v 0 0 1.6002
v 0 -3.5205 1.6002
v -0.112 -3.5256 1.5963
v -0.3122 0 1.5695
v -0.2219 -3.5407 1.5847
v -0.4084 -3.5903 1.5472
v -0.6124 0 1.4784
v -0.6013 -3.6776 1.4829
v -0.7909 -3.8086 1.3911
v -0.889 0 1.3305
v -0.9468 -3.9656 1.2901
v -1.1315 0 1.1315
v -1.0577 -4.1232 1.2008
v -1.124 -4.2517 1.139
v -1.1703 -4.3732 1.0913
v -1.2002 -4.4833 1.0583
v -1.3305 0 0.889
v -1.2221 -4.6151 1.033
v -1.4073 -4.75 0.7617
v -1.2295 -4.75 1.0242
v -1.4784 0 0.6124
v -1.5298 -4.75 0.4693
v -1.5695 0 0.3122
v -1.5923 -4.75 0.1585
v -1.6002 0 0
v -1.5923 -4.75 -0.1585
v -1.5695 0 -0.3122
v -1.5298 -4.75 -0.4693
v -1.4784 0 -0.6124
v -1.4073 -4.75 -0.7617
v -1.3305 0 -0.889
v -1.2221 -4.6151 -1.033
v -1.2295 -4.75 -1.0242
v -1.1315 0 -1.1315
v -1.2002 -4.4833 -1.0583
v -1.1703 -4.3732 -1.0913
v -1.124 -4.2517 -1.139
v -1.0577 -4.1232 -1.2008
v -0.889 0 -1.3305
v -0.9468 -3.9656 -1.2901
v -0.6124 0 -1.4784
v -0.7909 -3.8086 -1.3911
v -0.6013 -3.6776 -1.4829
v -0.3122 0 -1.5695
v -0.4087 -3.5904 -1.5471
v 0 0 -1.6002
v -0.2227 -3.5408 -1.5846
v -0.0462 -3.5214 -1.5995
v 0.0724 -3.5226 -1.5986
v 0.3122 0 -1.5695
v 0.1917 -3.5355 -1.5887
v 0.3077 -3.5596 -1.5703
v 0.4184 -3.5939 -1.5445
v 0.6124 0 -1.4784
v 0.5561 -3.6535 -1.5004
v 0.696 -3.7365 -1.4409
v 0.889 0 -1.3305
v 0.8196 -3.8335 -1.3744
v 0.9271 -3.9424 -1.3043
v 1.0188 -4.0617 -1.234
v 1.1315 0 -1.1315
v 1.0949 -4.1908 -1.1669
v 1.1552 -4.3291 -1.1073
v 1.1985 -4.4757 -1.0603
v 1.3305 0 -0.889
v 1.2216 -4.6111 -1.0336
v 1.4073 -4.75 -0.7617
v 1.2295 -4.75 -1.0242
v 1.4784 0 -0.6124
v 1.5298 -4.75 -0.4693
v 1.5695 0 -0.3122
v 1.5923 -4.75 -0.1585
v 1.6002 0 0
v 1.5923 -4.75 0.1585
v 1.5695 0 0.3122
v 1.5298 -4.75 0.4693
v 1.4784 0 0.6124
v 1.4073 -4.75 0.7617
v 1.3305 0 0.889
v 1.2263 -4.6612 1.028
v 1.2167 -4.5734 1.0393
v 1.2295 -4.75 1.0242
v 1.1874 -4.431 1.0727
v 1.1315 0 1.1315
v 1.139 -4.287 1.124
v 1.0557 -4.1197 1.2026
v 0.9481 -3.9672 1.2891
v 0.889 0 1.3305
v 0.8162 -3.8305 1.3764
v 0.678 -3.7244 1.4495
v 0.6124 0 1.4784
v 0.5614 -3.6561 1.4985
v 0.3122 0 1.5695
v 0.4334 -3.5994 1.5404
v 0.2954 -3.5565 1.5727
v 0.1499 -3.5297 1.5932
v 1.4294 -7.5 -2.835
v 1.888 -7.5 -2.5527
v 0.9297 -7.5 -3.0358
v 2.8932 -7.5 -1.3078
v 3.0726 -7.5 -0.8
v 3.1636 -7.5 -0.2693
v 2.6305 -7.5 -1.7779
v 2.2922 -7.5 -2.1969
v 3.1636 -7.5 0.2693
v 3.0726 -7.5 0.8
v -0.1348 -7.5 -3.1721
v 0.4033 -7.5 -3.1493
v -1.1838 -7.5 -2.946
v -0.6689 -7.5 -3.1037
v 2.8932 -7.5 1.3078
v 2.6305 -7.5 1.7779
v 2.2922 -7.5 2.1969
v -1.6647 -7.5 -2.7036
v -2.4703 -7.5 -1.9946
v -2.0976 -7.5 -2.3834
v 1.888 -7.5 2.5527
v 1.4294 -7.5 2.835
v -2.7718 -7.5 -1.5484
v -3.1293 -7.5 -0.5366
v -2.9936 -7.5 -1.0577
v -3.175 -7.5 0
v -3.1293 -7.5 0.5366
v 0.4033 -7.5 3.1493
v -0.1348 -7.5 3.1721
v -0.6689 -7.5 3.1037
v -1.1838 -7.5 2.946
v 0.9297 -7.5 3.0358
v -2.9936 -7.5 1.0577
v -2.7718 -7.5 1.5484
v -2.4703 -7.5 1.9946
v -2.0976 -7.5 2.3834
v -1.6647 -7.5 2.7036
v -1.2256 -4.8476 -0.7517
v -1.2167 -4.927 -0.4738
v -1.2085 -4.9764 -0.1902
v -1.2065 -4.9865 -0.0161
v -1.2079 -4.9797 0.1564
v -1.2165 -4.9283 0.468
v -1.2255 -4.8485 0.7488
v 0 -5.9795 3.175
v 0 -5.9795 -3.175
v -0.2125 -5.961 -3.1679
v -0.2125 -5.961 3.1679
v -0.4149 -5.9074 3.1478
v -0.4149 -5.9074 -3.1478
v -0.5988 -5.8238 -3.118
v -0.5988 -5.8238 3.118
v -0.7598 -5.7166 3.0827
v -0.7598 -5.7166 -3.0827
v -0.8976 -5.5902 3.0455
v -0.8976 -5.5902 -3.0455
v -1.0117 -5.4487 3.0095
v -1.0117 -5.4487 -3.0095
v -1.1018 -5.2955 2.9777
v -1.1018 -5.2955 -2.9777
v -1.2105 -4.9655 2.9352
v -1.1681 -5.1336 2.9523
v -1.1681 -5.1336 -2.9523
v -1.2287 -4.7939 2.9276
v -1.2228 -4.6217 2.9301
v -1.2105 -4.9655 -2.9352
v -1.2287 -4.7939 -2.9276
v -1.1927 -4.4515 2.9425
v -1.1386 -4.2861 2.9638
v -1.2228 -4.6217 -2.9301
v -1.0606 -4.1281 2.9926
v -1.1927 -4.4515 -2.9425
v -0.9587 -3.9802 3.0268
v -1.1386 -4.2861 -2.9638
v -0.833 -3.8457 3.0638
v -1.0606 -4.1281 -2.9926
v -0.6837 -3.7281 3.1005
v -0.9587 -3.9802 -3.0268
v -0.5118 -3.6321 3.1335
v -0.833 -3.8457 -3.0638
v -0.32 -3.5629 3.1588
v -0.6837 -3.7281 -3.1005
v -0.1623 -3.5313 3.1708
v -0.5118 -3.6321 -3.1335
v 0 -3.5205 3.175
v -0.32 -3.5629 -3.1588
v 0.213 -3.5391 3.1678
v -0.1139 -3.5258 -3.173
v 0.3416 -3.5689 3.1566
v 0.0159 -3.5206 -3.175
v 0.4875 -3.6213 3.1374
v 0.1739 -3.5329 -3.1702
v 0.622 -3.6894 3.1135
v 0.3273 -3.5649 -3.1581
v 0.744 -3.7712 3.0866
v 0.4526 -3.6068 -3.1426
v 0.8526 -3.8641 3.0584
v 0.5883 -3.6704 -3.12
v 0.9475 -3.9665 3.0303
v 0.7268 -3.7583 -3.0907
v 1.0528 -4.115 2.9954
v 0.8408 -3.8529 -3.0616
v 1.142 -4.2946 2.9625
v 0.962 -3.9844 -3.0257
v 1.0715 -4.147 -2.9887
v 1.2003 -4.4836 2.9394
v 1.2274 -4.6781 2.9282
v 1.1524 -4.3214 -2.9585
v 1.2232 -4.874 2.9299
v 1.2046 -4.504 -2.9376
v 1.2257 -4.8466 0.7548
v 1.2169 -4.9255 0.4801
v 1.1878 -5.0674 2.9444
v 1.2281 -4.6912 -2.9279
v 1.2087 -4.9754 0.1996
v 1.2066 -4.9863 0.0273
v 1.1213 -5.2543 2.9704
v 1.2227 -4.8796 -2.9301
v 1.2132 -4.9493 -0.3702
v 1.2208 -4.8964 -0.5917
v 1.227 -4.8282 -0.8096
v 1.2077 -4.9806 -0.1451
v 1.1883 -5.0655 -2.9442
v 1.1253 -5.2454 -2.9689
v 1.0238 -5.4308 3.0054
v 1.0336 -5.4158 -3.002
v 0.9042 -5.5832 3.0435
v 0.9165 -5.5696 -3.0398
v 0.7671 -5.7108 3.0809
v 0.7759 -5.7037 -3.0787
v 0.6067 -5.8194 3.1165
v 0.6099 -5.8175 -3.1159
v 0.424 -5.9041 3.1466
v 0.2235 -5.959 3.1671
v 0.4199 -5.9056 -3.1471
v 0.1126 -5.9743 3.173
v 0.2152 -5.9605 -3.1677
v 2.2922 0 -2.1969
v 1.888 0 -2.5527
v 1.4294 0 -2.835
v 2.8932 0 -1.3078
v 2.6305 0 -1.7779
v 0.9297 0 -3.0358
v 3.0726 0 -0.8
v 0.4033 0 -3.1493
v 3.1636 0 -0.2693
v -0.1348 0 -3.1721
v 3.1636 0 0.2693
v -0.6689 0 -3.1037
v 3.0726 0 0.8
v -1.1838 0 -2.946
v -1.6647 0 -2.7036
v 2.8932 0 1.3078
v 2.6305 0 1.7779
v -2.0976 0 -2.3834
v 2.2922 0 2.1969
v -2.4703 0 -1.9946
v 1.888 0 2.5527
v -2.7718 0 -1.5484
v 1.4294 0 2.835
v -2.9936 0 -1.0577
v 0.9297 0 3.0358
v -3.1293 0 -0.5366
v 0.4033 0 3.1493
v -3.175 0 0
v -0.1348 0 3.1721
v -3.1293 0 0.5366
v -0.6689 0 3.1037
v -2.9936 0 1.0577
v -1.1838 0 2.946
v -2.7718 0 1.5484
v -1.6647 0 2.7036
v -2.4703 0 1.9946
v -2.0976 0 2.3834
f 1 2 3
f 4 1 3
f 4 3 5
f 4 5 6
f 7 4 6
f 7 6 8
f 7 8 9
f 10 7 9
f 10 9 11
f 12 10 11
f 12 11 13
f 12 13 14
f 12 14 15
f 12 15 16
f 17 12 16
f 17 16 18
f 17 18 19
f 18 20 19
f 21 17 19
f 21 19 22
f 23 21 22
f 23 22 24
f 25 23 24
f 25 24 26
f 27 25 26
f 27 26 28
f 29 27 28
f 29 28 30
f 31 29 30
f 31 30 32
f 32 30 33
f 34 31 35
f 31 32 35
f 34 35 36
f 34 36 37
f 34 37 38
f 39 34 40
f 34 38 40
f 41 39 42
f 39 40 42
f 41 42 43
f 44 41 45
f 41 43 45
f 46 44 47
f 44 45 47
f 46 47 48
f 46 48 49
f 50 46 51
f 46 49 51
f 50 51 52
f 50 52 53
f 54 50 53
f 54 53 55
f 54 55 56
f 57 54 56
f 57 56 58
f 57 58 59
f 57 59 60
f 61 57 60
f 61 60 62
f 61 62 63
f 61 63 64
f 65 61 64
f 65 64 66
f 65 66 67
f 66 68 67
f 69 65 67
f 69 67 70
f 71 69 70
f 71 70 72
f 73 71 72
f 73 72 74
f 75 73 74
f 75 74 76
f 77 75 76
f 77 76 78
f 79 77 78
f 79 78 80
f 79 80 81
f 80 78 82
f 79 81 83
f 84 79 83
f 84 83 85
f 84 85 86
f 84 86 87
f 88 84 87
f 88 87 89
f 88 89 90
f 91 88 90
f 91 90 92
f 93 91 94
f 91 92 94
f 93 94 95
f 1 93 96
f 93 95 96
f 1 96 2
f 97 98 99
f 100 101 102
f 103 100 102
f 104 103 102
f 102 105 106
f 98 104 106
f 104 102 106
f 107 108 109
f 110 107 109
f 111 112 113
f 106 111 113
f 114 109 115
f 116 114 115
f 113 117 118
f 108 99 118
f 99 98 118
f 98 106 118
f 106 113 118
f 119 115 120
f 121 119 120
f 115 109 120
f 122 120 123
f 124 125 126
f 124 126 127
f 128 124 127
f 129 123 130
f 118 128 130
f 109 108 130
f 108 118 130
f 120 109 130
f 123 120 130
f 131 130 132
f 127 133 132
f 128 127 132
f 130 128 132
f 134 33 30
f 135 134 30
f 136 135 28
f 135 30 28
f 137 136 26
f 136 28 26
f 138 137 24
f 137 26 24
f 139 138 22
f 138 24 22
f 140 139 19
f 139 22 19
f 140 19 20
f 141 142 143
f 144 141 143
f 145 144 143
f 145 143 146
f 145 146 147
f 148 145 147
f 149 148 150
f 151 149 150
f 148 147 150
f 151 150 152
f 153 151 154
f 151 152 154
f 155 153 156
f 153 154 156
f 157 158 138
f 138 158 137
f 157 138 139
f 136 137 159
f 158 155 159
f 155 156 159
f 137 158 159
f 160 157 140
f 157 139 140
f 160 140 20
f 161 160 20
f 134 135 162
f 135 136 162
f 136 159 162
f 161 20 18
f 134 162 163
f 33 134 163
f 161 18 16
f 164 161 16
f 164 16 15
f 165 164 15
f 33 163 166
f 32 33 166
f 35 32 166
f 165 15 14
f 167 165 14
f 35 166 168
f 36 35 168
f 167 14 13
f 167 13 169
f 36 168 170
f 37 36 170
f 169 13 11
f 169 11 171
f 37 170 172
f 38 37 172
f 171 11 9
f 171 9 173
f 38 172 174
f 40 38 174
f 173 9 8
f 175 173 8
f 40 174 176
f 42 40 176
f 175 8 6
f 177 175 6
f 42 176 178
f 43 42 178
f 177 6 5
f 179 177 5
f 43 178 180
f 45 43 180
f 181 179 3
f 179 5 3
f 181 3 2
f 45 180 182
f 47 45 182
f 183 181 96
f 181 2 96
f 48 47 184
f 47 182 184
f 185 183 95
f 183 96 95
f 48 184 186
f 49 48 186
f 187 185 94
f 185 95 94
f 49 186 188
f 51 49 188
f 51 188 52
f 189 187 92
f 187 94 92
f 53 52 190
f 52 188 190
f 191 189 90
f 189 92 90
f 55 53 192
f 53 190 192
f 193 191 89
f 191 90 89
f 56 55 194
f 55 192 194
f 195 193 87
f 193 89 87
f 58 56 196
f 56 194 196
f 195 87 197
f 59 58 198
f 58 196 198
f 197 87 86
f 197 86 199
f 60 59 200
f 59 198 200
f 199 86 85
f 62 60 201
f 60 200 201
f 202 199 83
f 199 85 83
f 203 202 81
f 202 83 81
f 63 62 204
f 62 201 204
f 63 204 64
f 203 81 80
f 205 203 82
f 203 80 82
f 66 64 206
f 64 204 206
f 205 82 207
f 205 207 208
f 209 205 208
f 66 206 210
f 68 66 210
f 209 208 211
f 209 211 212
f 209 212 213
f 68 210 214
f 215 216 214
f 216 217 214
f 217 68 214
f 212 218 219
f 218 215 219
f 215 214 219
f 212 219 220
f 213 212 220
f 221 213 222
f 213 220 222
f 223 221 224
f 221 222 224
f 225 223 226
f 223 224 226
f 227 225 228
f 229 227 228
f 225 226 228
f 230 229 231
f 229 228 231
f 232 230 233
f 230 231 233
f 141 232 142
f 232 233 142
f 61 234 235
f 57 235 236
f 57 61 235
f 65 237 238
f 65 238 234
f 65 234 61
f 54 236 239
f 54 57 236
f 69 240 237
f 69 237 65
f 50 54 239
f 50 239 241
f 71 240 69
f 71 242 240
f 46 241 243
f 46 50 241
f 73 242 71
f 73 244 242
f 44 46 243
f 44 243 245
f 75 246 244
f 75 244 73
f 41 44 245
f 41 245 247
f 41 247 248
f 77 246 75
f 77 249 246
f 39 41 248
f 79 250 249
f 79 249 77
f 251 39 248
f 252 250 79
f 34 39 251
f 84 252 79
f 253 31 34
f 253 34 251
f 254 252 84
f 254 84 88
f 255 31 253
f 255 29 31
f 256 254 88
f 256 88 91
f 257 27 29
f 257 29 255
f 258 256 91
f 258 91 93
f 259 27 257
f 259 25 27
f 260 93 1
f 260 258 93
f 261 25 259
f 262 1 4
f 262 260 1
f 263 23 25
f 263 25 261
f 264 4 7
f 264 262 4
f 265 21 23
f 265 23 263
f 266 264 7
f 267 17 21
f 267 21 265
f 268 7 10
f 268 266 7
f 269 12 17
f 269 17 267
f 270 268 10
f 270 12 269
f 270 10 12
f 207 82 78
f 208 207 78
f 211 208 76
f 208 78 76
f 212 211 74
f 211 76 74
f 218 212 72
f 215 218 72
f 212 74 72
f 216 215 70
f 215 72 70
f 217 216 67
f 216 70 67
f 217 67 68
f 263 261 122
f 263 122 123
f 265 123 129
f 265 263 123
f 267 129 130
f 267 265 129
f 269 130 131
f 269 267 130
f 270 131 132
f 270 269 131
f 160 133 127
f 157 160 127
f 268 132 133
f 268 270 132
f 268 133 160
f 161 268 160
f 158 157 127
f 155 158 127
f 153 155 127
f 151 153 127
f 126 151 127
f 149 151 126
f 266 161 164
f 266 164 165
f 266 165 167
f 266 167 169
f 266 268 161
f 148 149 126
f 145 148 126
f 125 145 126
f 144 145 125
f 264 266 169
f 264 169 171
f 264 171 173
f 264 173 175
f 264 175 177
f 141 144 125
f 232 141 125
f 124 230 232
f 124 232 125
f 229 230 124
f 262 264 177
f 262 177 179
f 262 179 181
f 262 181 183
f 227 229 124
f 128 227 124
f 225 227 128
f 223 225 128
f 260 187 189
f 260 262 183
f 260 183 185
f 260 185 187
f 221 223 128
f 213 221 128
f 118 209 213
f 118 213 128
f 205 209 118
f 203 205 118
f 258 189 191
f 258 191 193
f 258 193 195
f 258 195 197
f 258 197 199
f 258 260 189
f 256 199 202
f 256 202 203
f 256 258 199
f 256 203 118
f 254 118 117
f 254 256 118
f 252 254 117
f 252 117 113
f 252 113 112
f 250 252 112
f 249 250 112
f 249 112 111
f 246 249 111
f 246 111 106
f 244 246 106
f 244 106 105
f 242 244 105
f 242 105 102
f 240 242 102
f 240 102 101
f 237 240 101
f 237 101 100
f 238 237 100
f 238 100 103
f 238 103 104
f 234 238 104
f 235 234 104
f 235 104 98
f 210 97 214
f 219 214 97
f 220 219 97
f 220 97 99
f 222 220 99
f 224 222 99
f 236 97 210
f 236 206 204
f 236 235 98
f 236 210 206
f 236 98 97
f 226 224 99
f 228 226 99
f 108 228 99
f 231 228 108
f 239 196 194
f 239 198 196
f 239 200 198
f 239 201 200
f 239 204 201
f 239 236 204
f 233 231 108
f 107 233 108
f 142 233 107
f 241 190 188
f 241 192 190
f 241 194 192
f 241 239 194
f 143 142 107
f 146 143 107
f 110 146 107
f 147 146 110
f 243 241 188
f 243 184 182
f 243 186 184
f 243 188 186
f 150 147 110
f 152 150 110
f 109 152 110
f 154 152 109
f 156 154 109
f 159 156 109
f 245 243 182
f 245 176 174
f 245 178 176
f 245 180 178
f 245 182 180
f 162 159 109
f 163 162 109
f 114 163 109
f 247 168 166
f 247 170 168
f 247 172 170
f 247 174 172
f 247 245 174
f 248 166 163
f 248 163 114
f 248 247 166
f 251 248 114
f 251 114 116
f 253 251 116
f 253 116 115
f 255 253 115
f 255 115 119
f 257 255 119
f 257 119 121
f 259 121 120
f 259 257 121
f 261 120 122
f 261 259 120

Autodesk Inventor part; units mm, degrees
ref_plane "YZ Plane" through (0, 0, 0) normal (1, 0, 0) x (0, 1, 0)
ref_plane "XZ Plane" through (0, 0, 0) normal (0, 1, 0) x (-1, 0, 0)
sketch "Sketch1" plane through (0, 0, 0) normal (0, 1, 0) x (-1, 0, 0)
  circle A0 centre (0, 0) radius 3.175
  circle A1 centre (0, 0) radius 1.5
  dimension "d0" = 6.35
  dimension "d1" = 3
extrude "Extrusion1" add sketch "Sketch1" against normal blind 7.5 contours A0 | A1
ref_plane "Work Plane1" through (0, 0, 3.175) normal (0, 0, 1) x (1, 0, 0)
sketch "Sketch2" plane through (0, 0, 3.175) normal (0, 0, 1) x (1, 0, 0)
  line L0 (-3.175, -7.5) -> (3.175, -7.5) projected
  line L1 (3.175, 0) -> (-3.175, 0) projected
  line L2 (-3.175, 0) -> (-3.175, -7.5) projected
  line L3 (-3.175, -2) -> (3.175, -2) construction
  circle A0 centre (0, -4.75) radius 1.5
  dimension "d11" = 2
  dimension "d12" = 3
  dimension "d13" = 2.75
  dimension "d14" = 3.175
hole "Threaded Hole" at (0, -4.75, 3.175) direction (0, 0, -1) diameter 2.459 end through all thread size "M3x0.5" class "6H" standard "ANSI Metric M Profile"
hole "Pin Bearing Hole" at (0, 0, 0) direction (0, -1, 0) diameter 3.2004 depth 4.75 tip angle 118 clearance for "Socket Head Cap Screw" size "M3" standard "Ansi Metric M Profile"
equation "\"d9\" = d11 + d13"
properties part number "Bearing Nut" material "Steel, Alloy"
